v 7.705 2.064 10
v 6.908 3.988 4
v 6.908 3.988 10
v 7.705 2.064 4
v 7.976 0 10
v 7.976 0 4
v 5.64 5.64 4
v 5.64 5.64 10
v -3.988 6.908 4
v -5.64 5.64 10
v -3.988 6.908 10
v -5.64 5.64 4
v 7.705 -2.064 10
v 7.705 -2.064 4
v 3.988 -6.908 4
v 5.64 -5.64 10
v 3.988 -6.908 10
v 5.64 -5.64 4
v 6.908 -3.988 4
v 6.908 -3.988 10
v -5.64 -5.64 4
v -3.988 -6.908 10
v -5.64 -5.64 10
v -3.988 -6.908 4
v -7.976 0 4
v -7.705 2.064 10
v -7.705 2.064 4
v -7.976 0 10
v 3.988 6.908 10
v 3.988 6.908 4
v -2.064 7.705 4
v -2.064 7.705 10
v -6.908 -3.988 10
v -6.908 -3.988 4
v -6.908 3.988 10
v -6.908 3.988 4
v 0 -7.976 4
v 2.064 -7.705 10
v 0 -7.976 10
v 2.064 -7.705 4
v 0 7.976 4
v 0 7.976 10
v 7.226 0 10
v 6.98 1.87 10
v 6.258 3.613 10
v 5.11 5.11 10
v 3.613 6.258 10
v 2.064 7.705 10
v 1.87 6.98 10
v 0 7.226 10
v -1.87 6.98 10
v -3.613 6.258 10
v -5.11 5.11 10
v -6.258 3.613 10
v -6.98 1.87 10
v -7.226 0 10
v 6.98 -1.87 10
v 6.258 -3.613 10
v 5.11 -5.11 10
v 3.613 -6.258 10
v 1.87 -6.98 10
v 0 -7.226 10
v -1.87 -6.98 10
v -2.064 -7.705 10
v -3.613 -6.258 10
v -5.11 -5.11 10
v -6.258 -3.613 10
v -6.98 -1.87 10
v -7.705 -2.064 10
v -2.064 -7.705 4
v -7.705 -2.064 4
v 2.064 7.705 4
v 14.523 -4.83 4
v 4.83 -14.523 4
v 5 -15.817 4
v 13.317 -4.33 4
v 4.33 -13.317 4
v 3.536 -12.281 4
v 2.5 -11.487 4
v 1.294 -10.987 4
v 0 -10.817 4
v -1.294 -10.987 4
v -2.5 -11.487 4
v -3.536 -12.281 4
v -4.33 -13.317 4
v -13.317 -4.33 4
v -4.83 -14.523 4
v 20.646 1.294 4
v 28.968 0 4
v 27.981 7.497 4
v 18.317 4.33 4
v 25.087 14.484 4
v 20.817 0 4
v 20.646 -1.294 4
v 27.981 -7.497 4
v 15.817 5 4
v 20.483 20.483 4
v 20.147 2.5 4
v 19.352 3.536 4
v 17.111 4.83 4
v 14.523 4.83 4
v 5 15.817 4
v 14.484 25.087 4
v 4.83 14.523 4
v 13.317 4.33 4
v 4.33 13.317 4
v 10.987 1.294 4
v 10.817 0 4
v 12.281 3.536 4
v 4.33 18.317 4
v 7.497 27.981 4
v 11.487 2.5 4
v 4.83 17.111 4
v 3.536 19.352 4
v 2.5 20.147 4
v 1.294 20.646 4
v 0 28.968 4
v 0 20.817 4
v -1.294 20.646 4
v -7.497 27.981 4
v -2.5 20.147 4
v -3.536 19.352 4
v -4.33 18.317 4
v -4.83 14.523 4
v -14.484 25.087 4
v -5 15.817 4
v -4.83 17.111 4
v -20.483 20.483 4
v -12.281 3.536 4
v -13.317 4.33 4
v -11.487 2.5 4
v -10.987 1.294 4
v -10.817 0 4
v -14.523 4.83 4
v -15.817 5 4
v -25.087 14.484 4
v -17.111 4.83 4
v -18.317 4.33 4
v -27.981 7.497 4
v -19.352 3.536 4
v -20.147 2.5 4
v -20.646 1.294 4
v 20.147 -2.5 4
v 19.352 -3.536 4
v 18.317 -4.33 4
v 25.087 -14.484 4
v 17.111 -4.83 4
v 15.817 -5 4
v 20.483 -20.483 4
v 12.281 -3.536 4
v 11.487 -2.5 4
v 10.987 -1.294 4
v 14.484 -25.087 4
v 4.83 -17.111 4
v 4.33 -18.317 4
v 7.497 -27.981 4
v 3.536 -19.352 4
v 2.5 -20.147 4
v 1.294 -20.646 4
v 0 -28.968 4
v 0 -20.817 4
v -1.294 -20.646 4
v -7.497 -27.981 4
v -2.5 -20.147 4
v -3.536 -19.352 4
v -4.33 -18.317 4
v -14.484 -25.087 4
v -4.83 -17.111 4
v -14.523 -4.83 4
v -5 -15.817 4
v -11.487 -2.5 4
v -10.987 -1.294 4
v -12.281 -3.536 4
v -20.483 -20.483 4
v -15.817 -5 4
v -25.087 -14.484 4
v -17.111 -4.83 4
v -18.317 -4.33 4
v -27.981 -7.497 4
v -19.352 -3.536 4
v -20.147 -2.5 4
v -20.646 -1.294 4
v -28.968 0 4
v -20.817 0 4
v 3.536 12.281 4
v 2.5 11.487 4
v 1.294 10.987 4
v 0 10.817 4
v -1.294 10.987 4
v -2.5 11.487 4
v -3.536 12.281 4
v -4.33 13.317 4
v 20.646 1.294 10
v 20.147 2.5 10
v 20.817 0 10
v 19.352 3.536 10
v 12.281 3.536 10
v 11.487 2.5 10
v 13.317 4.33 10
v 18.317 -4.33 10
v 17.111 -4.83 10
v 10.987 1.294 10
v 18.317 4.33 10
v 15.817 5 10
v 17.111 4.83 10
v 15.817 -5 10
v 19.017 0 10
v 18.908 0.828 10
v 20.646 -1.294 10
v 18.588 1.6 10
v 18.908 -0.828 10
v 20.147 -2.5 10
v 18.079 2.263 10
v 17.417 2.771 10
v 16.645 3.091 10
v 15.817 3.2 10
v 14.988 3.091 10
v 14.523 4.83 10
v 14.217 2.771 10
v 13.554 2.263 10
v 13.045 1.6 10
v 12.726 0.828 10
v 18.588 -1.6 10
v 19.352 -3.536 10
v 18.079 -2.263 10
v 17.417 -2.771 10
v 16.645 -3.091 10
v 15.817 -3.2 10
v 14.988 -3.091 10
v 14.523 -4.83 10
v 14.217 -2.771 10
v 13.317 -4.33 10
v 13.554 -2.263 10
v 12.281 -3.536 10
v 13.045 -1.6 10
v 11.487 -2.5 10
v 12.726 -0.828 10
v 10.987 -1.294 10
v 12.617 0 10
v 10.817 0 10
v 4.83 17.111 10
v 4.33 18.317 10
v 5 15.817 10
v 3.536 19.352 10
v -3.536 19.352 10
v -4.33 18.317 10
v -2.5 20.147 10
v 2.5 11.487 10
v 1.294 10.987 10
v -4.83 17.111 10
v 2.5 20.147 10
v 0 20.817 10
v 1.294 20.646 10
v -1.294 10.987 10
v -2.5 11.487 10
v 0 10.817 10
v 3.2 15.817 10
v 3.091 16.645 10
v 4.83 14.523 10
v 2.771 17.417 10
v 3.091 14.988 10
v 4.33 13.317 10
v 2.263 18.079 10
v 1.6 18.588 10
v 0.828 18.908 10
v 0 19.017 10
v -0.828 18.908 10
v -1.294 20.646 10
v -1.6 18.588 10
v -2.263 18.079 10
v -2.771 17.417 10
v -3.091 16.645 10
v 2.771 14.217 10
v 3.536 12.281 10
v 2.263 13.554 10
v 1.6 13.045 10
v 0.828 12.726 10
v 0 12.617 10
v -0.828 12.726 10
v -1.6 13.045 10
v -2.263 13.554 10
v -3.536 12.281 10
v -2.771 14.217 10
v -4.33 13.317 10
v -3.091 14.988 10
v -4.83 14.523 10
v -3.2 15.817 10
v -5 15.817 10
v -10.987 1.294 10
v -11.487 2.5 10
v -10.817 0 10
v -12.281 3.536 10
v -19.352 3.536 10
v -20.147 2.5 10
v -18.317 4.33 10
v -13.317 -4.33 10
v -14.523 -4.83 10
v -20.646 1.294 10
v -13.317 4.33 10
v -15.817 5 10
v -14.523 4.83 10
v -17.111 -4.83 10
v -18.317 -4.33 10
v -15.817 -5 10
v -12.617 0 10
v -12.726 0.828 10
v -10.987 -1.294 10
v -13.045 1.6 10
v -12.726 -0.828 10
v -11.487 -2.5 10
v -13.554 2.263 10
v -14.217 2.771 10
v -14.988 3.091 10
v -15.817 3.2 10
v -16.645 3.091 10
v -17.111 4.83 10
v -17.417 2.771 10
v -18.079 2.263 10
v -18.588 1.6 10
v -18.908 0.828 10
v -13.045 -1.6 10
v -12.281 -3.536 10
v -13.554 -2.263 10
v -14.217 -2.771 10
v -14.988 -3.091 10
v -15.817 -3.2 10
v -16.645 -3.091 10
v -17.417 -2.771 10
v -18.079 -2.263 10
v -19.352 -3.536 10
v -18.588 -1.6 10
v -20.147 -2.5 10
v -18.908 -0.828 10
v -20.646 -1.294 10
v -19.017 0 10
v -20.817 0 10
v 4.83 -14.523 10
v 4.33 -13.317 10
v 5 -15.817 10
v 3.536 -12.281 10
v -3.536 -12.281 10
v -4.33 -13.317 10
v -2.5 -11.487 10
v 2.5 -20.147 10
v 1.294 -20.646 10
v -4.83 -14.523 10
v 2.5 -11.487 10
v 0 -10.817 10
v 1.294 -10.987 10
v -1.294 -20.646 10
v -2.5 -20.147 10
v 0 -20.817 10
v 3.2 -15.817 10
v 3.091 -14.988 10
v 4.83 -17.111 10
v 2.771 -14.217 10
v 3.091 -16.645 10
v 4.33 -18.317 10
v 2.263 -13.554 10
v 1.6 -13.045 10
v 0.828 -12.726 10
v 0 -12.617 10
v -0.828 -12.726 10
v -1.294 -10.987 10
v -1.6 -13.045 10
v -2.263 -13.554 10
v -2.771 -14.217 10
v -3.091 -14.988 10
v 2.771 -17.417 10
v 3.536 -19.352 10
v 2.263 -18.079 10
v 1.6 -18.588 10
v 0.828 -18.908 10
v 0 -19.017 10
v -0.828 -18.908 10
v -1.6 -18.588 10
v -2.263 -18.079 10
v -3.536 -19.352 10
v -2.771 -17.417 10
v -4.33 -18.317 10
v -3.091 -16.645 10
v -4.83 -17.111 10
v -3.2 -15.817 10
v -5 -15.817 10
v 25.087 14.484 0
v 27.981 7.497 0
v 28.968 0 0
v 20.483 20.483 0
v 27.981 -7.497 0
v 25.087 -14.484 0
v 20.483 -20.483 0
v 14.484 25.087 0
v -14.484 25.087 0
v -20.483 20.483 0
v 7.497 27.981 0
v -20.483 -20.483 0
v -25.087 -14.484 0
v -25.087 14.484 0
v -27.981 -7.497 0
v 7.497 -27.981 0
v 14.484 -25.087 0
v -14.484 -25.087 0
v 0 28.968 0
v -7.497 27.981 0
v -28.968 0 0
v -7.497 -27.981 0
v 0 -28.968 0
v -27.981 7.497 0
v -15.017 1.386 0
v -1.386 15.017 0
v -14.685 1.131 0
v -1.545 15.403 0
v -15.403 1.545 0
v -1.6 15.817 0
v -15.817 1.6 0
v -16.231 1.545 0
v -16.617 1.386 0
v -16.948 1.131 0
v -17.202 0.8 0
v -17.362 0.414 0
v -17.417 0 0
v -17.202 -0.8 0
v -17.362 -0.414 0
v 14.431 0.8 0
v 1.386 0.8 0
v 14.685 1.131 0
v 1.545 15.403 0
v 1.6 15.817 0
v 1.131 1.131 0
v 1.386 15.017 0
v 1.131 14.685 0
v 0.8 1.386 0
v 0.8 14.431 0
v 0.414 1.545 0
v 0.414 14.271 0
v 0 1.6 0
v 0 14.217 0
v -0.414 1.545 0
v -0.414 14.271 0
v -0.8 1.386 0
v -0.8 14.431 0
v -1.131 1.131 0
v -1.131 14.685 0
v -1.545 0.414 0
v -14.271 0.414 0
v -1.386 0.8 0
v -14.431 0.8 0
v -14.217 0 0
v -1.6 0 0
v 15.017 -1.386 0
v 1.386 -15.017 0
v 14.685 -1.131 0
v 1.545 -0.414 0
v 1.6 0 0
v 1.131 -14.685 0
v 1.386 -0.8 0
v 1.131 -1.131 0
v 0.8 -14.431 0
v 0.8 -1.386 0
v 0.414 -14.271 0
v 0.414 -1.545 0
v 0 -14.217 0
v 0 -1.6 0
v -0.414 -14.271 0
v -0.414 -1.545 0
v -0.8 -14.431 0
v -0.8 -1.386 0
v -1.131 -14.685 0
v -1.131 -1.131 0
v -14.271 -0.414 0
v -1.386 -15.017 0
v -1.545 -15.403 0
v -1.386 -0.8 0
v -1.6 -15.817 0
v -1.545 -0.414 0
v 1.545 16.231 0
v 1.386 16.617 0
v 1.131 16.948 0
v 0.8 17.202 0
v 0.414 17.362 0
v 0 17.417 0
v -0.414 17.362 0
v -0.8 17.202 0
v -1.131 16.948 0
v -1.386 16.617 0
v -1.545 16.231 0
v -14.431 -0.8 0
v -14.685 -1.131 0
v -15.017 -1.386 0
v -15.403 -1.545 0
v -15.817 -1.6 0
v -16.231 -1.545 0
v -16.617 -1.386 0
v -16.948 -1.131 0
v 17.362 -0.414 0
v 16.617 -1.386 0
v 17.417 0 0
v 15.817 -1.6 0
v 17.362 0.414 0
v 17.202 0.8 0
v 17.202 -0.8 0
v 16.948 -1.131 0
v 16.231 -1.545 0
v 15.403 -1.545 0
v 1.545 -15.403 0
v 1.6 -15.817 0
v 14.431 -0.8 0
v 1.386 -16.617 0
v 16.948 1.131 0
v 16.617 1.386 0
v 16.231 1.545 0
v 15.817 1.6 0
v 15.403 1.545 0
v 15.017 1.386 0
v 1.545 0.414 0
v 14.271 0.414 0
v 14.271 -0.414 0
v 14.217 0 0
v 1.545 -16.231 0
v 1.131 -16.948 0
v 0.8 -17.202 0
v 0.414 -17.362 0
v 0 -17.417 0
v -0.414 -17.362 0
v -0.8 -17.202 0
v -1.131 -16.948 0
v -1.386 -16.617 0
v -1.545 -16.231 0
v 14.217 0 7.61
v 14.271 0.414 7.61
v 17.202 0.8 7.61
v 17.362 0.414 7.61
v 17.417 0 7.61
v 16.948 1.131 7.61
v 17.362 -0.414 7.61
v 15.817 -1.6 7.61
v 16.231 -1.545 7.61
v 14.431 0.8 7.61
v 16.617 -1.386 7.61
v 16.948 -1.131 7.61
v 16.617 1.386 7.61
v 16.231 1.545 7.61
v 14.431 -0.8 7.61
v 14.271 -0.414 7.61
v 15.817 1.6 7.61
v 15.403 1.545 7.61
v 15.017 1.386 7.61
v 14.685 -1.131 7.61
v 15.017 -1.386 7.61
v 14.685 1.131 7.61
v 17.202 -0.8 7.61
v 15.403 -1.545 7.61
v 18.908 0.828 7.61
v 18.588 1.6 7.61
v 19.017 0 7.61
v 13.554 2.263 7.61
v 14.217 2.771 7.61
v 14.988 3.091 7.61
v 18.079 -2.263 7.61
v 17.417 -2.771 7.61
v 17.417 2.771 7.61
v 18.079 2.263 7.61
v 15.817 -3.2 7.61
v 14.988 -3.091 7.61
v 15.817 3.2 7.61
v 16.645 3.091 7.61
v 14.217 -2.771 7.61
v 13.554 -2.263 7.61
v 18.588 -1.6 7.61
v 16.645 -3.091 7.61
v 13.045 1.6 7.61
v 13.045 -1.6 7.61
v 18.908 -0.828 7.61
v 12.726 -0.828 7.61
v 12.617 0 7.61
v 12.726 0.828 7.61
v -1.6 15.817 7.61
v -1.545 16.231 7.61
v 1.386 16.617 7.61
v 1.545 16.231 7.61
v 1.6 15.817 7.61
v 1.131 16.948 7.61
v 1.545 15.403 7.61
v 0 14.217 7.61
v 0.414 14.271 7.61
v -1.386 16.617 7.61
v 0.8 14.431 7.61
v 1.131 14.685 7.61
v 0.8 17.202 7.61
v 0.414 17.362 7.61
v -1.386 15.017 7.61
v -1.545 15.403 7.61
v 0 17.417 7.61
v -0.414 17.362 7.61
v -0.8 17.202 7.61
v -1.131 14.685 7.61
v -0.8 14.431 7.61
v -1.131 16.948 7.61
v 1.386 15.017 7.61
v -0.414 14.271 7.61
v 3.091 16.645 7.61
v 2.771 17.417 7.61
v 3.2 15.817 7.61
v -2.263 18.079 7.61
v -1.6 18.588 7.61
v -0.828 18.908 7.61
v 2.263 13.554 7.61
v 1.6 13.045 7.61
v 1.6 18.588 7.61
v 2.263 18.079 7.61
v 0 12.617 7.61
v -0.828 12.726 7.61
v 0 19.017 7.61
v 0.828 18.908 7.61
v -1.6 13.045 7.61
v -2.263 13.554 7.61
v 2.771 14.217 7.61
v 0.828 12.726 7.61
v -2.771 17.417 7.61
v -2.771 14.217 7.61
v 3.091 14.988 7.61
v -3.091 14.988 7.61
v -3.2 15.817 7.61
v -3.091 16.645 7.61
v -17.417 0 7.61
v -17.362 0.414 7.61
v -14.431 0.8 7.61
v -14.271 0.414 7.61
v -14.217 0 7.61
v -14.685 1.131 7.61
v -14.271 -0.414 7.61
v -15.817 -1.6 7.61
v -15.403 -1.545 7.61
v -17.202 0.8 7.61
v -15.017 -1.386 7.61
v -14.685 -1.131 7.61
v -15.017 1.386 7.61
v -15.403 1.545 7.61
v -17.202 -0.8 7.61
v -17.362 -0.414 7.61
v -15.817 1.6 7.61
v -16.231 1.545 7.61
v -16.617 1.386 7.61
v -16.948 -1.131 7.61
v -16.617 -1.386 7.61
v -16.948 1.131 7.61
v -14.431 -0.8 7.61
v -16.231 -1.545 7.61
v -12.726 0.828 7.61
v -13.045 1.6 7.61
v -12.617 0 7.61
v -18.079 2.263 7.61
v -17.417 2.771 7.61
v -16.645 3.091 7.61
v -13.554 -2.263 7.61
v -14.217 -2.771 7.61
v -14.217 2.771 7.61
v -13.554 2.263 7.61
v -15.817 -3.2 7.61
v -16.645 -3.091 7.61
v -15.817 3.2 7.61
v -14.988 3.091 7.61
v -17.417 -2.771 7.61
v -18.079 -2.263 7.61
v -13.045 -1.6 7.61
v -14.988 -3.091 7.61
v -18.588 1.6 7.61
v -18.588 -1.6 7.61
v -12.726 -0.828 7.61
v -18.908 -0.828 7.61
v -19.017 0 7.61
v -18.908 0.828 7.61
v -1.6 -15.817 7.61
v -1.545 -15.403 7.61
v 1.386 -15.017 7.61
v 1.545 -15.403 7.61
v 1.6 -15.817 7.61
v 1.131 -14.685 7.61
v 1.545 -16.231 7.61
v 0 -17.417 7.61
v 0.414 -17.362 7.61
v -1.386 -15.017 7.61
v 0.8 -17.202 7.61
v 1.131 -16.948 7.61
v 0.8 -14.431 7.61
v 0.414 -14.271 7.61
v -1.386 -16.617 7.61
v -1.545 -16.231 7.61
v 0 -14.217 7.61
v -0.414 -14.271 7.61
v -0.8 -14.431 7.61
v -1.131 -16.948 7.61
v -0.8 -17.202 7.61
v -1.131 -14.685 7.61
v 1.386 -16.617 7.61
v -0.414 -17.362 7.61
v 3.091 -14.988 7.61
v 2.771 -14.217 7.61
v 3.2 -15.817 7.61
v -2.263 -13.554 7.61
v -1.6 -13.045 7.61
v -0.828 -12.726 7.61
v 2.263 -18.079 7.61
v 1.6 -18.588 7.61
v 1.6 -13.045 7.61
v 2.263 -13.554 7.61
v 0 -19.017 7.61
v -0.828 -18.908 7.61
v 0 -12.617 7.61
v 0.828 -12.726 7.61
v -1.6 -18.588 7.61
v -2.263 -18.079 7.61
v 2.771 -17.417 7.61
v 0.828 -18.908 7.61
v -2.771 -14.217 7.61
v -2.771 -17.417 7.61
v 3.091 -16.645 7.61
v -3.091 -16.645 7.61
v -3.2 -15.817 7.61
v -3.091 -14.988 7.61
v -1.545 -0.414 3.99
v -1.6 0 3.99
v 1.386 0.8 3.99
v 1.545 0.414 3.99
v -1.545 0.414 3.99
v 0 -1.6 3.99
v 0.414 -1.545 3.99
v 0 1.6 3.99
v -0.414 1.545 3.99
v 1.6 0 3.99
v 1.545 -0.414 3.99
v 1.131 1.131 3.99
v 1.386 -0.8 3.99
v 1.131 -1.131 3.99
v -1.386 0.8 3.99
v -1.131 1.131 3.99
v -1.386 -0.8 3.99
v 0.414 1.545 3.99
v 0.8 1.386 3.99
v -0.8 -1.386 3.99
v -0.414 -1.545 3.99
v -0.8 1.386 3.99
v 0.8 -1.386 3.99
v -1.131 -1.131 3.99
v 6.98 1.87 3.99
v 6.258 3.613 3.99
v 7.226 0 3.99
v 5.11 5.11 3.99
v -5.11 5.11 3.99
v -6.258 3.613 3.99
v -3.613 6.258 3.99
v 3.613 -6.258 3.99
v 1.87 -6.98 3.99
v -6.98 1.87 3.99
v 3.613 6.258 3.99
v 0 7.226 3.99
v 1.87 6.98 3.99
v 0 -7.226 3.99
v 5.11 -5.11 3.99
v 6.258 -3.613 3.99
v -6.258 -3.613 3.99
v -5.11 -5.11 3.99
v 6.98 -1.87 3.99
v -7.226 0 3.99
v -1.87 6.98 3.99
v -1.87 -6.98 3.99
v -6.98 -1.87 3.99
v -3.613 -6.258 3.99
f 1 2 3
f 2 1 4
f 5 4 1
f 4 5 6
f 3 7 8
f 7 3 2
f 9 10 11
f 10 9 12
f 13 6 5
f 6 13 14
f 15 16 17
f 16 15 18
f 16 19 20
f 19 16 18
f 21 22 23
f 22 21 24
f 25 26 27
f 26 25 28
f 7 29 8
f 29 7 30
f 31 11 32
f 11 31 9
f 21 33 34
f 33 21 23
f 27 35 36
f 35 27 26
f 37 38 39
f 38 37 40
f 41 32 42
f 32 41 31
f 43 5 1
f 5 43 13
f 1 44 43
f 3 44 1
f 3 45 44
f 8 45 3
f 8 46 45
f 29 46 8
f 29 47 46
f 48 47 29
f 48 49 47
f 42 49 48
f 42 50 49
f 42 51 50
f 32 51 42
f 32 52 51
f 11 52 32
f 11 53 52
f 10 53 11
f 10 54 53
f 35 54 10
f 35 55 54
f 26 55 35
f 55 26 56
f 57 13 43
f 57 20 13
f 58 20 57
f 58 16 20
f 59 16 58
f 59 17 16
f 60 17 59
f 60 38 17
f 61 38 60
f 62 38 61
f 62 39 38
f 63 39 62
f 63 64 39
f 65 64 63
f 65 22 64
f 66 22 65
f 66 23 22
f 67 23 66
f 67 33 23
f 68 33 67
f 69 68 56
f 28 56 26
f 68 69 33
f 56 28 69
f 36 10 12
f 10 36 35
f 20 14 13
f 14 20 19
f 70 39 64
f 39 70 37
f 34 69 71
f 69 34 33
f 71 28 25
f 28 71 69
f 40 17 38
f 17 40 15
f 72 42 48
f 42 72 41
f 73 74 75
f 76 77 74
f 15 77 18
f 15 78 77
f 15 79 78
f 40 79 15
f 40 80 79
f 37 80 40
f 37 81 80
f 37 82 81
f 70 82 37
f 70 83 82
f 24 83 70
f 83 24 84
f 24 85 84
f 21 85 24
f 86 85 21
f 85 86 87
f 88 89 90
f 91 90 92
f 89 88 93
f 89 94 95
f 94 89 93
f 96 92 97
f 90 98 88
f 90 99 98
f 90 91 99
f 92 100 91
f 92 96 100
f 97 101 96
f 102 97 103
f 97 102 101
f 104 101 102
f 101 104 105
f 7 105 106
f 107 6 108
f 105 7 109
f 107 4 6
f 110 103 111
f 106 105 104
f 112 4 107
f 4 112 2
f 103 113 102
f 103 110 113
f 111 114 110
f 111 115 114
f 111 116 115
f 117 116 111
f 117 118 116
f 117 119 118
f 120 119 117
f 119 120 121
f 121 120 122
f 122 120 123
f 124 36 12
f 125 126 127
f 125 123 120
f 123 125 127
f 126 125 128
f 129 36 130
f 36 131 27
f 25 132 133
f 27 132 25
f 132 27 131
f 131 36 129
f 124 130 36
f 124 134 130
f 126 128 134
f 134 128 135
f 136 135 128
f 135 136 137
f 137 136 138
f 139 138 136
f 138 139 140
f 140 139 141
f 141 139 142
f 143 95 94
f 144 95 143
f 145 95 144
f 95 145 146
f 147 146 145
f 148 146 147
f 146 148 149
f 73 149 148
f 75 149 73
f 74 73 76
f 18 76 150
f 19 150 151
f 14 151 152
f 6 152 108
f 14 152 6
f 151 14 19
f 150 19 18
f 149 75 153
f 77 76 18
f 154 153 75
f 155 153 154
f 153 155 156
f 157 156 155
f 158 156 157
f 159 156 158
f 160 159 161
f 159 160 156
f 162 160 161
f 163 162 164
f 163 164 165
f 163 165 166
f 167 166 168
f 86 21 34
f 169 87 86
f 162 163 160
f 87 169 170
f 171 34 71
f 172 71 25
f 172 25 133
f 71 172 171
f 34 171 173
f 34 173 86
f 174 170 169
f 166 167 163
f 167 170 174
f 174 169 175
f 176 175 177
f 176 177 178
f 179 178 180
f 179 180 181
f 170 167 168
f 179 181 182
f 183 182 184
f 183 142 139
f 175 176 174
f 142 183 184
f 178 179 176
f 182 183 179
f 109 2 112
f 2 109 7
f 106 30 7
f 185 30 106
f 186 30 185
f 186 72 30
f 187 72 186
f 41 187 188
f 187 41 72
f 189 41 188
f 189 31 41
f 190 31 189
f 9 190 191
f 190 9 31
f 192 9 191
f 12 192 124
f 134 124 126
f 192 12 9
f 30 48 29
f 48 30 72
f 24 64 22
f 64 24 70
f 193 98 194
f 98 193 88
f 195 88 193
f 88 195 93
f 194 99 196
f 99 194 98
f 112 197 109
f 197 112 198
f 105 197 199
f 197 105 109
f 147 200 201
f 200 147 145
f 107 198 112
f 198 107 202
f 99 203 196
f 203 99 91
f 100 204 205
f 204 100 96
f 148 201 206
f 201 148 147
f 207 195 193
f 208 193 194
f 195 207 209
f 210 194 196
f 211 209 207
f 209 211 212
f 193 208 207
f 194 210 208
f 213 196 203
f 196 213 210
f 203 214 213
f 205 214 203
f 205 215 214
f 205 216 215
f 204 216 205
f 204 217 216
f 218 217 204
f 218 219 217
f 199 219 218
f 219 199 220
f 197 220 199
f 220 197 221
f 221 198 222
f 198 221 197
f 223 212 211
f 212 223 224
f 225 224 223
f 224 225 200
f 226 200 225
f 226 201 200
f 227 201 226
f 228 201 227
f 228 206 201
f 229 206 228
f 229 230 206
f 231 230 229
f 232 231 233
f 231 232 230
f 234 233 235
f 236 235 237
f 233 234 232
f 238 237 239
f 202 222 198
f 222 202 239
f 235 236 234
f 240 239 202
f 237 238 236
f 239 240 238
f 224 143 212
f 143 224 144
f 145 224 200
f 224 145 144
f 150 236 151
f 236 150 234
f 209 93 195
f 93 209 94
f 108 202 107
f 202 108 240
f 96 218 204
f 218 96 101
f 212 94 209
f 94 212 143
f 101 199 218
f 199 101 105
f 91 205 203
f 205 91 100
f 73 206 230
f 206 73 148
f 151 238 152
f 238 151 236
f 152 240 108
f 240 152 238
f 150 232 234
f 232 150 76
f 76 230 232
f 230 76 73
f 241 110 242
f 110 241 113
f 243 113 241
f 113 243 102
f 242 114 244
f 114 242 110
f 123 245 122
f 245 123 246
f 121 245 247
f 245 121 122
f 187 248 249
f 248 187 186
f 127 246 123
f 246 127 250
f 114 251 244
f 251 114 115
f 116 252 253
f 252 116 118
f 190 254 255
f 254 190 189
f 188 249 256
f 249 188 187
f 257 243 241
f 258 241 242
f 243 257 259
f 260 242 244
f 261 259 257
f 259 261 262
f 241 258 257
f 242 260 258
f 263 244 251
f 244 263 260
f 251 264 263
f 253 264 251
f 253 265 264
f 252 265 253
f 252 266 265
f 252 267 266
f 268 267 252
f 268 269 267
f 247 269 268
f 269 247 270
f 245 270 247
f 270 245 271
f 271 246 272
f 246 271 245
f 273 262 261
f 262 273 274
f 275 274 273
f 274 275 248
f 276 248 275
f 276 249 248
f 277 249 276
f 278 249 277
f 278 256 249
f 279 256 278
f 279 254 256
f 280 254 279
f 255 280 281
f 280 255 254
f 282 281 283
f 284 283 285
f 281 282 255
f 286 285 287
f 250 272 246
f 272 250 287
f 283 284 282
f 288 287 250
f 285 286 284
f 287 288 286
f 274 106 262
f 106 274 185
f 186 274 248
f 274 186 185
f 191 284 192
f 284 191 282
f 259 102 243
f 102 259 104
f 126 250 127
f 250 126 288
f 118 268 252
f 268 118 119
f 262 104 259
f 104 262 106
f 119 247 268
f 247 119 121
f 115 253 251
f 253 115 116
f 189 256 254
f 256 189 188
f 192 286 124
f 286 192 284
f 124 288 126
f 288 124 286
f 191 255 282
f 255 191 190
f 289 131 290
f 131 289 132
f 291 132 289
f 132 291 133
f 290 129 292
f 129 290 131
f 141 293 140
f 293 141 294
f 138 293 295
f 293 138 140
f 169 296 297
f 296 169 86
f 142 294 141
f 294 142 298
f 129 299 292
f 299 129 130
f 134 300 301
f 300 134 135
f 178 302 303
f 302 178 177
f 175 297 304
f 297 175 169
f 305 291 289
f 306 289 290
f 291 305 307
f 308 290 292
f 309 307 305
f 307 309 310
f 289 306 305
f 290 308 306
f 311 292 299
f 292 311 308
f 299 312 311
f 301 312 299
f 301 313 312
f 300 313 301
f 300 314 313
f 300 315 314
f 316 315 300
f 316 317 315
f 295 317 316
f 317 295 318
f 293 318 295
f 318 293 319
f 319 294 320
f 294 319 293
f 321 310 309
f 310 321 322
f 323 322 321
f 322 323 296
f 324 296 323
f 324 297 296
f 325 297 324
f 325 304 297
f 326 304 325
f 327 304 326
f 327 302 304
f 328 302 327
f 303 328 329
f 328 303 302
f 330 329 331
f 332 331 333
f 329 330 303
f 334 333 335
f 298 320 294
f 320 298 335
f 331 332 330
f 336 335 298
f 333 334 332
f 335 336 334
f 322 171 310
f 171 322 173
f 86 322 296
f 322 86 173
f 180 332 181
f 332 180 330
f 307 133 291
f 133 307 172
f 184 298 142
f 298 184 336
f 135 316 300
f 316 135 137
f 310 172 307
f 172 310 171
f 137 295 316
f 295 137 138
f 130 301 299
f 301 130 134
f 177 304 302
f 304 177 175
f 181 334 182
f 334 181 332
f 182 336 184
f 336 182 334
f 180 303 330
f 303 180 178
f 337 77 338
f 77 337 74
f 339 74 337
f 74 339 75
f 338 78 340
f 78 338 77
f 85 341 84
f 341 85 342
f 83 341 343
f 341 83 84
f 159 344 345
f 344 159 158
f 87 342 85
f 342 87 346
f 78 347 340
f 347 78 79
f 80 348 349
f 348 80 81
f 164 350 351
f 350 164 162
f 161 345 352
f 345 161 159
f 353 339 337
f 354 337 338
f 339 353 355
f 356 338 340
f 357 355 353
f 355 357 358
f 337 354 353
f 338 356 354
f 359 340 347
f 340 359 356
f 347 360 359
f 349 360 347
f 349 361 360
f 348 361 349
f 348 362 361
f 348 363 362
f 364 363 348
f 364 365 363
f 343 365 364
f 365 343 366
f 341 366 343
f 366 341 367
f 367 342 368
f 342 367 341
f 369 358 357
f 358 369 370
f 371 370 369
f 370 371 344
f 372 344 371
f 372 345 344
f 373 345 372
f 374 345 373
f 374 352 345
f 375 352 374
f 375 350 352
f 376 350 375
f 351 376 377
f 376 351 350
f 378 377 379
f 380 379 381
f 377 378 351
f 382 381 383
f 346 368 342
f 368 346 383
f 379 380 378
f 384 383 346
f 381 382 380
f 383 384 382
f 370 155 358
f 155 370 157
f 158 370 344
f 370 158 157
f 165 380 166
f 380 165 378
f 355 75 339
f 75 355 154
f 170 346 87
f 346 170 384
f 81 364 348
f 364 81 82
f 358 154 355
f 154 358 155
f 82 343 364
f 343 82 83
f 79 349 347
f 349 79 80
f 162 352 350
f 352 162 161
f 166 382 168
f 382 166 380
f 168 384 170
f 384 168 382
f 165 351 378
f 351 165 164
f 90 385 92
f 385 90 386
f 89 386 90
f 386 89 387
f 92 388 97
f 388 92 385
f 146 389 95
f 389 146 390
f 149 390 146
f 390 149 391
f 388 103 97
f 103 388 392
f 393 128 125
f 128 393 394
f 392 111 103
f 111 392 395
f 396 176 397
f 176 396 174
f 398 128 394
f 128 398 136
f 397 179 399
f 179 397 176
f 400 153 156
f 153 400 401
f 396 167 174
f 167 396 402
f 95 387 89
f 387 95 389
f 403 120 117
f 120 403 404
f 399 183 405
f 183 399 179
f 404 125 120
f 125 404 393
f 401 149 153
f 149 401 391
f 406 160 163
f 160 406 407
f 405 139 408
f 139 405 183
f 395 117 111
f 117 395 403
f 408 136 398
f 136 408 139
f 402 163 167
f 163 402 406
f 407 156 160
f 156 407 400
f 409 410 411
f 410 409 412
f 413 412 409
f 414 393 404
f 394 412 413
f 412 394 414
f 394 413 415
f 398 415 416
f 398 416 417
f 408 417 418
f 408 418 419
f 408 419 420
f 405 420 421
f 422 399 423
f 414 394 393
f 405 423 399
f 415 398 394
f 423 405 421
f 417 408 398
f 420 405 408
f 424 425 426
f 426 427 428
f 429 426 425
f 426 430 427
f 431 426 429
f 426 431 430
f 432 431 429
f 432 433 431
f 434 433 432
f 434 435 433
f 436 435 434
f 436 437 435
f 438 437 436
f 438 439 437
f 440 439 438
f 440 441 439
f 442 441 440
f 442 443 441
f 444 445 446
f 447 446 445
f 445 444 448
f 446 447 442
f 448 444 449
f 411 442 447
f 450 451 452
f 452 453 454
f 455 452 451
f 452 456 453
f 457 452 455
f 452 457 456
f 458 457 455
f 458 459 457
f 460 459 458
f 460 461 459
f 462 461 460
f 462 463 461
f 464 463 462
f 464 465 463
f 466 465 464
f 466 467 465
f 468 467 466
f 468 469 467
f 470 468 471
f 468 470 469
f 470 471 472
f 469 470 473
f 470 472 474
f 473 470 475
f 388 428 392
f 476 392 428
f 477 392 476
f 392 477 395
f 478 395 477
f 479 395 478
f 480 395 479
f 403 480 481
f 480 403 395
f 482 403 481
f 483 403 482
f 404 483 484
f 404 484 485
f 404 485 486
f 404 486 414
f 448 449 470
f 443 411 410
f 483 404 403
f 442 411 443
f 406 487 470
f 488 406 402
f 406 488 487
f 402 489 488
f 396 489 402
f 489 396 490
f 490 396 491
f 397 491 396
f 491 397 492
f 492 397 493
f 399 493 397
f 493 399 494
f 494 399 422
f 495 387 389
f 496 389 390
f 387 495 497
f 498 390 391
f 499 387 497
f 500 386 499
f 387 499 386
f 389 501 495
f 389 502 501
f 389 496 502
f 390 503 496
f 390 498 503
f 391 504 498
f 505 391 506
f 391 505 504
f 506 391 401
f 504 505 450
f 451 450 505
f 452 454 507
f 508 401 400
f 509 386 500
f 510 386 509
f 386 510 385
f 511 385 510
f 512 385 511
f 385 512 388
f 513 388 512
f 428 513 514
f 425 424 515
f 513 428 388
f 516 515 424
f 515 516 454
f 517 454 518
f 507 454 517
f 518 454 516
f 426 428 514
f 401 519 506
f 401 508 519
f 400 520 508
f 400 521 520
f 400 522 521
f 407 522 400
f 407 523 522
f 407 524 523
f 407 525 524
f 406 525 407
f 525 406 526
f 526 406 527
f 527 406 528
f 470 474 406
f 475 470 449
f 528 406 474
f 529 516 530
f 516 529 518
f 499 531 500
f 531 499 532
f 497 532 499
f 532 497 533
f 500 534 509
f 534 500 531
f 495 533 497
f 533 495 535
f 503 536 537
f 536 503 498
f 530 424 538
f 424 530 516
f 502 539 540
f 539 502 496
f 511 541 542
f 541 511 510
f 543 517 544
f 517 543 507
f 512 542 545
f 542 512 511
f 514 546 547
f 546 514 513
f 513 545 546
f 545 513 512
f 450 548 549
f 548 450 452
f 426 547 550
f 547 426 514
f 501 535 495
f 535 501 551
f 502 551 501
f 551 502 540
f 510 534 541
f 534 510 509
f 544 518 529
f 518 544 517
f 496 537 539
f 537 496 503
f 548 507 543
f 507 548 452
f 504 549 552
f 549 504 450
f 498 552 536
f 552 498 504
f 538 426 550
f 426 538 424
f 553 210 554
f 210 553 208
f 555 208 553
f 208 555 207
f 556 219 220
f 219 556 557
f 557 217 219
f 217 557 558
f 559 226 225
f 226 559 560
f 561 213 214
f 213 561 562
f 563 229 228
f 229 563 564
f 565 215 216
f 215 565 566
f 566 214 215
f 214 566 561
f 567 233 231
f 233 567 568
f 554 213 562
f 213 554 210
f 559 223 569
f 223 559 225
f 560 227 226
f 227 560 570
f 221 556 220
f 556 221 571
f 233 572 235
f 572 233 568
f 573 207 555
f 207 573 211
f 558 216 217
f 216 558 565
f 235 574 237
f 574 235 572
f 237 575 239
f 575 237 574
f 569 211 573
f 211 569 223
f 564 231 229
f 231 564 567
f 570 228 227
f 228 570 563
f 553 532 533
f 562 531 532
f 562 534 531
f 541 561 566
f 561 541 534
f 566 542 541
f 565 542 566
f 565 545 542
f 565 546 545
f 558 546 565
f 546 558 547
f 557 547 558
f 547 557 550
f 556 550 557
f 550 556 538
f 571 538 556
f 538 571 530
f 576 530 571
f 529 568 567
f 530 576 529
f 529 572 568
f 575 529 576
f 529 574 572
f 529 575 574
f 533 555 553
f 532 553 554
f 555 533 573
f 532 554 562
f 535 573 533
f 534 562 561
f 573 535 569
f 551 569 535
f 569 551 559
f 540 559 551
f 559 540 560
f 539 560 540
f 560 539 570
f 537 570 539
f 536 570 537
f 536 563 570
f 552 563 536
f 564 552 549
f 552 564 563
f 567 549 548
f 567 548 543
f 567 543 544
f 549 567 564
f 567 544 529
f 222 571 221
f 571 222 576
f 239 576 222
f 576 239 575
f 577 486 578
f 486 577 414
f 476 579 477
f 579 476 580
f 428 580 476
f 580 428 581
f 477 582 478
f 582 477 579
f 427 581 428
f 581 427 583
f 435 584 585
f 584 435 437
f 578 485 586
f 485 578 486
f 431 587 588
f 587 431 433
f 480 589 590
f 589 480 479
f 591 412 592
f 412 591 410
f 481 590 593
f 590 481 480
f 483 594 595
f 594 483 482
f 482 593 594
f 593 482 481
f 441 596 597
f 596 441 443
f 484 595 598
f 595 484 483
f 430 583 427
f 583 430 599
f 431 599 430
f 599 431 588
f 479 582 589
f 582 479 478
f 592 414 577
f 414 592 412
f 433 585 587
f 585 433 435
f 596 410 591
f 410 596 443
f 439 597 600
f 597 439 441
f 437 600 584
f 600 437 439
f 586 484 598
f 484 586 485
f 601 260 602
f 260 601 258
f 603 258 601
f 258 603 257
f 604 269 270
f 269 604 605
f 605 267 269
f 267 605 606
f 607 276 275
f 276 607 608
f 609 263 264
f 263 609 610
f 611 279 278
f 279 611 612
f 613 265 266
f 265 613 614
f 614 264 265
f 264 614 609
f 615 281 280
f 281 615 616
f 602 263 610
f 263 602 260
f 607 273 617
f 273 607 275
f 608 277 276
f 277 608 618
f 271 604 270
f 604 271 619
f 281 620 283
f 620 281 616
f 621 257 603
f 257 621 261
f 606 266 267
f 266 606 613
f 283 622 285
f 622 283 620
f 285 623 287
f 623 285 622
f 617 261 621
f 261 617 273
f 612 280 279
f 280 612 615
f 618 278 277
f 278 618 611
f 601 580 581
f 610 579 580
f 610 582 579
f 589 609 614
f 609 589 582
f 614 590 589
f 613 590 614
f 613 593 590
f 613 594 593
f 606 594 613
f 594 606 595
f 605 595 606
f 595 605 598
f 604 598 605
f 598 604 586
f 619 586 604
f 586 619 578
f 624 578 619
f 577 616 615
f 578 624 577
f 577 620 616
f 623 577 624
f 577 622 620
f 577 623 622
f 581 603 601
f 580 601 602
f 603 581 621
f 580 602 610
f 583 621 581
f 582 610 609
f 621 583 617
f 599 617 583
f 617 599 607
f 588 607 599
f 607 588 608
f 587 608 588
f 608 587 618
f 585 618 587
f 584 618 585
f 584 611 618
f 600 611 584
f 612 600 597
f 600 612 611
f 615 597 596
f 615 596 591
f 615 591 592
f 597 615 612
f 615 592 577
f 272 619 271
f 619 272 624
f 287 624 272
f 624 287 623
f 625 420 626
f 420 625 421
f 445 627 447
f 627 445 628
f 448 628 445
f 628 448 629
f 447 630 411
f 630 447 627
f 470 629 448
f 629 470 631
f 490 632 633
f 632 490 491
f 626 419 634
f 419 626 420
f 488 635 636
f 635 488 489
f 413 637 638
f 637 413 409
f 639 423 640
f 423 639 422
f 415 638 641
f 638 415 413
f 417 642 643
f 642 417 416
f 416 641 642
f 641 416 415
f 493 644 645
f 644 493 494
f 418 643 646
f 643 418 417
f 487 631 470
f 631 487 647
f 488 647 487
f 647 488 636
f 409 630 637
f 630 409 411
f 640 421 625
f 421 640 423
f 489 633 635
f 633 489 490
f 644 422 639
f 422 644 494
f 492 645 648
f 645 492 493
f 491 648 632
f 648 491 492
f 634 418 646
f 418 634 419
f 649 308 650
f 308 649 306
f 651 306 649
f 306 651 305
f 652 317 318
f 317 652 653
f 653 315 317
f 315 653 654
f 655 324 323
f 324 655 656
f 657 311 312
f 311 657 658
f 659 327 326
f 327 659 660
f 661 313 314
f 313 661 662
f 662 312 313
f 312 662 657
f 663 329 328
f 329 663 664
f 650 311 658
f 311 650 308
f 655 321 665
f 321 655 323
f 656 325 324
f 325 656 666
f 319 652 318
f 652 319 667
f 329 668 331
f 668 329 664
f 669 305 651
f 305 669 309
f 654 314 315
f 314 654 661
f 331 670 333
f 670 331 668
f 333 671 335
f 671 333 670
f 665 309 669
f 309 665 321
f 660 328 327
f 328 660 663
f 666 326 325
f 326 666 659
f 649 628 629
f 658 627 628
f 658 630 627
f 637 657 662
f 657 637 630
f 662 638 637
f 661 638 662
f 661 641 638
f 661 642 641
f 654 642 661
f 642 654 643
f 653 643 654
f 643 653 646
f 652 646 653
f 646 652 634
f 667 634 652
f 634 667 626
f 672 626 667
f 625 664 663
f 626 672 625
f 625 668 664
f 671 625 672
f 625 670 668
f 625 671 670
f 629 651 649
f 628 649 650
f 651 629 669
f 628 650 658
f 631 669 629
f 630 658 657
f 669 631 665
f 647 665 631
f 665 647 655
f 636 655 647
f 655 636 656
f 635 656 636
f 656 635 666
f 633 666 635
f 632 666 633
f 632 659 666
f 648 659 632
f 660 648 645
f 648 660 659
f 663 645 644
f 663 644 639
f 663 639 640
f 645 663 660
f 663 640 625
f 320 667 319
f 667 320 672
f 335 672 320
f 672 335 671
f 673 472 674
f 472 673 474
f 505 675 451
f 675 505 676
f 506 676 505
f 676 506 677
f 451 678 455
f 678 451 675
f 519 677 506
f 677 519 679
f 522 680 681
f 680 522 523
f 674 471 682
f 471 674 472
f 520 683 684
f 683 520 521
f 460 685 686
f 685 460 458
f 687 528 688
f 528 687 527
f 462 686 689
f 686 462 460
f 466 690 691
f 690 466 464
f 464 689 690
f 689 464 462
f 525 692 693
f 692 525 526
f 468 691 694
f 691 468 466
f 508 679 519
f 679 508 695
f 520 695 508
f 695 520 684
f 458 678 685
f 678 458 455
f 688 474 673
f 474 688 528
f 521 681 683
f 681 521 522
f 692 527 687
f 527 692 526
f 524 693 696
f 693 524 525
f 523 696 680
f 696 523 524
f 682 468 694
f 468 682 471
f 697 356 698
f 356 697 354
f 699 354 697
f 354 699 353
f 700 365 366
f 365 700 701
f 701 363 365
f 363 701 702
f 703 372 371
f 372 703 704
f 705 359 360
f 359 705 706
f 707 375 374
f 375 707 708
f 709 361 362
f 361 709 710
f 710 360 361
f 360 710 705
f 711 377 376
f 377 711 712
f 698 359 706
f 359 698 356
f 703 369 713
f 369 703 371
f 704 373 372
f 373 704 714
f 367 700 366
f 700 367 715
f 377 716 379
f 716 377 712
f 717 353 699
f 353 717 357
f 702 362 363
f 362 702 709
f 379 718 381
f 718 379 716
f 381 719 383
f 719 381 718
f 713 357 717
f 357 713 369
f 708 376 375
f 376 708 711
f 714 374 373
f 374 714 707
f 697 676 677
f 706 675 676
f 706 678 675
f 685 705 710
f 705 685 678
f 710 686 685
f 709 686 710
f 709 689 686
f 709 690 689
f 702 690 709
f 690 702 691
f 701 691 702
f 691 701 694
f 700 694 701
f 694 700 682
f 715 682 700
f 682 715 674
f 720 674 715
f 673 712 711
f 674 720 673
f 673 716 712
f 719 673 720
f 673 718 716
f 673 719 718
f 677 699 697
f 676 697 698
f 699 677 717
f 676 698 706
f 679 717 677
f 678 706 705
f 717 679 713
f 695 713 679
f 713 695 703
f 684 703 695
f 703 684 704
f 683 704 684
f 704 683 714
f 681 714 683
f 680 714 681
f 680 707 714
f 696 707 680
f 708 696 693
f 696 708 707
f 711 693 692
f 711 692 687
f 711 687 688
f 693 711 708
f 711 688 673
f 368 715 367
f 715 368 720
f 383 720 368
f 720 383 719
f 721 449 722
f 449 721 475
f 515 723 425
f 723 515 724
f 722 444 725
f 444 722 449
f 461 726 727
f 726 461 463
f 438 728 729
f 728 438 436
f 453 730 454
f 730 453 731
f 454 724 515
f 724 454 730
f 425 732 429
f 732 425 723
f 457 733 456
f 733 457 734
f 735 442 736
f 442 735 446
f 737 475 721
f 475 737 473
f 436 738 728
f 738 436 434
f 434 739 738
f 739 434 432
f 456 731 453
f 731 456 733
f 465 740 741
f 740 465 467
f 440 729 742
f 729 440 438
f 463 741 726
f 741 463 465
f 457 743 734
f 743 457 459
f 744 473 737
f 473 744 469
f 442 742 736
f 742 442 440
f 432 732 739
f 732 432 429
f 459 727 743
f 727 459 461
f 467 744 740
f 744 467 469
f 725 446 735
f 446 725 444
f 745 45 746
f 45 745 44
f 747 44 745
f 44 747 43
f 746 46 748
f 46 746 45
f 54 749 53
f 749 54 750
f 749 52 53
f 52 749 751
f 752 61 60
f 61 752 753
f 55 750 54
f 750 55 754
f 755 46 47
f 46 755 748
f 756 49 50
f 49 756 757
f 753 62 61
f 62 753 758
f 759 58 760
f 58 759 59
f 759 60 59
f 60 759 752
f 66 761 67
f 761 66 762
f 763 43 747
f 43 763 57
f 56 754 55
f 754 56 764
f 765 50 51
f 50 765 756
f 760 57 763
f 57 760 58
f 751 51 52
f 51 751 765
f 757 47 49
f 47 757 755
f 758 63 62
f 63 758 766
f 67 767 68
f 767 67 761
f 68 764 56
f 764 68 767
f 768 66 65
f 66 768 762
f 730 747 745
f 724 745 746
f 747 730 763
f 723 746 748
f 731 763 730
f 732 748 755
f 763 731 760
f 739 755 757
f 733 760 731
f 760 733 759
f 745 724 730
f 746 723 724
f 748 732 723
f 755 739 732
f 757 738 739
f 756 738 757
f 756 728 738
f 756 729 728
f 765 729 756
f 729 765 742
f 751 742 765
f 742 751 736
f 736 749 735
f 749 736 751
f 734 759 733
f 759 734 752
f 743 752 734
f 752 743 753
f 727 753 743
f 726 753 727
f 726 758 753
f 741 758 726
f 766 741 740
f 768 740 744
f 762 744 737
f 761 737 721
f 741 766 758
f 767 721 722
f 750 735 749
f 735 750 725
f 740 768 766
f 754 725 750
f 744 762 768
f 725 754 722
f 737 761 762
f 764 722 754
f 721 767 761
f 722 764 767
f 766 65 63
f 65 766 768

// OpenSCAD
//====================================================
// Печатная оснастка для геликальной антенны (спираль не выводится)
// DEV версия v16
//====================================================
// Задача: печатные детали для сборки axial-mode геликальной антенны:
// - Труба для намотки (опционально канавка-ориентир; спираль не печатается)
// - Шаблон для сверления/резки рефлектора (опционально)
// - Крепеж из 2 деталей: (A) площадка под трубу с кольцом и стойками, (B) крепление к плоскости с 4 ушами
// - Посадка под SMA на квадратной площадке со стороны рефлектора
// - Опциональный кондуктор для гибки дельта-матча (сам дельта-матч - проволока)
//
// Единицы: миллиметры
//====================================================

/* [Быстрый экспорт] */
export_part = "plate"; // [assembly,tube,tube_section,plate,wall_mount,reflector_template,delta_jig]

// что вывести/экспортировать

/* [РЧ параметры] */
freq_mhz = 5800;          // Рабочая частота (МГц)
target_gain_dbi = 12;     // Только для расчёта длины трубы (спираль не выводится)
polarization = "RHCP";    // [RHCP,LHCP]

// ориентир: RHCP/LHCP

/* [Геометрия спирали] */
circumference_factor = 1.00;  // C ≈ 1.0*λ (старт для axial-mode)
pitch_factor = 0.25;          // S ≈ 0.25*λ (старт для axial-mode)
min_turns = 5.5;
max_turns = 14;

/* [Проволока и согласование] */
wire_d = 1.2;                 // Диаметр проволоки (мм)
wire_material = "CuAlloy";    // [CuAlloy,Brass,Al]

// потери разные; геометрия важнее для согласования
delta_mode = "auto";          // [auto,manual] auto=авторасчёт, manual=вручную
delta_base_manual = 0;        // мм (0 = игнорировать)
delta_height_manual = 0;      // мм (0 = игнорировать)
delta_tap_manual = 0;         // мм от "заземлённого" конца по стороне треугольника (0 = игнорировать)

/* [Труба намотки] */
tube_wall = 2.0;              // mm
tube_clearance = 0.25;        // мм (посадка на кольцо)
tube_groove_enable = true;    // делать направляющую канавку (для ровной укладки проволоки)

groove_segments_per_turn = 24; // Кол-во сегментов канавки на один виток (выше = ровнее, но медленнее)

tube_groove_depth = 0.5;      // мм (глубина канавки в трубе)
tube_groove_width = 1.2;      // mm
tube_sections = 3;            // кол-во секций трубы для печати
tube_section_gap = 0.25;      // мм зазор между секциями (допуск сборки)
export_section = 0;           // какую секцию экспортировать при export_part="tube_section"

/* [Площадка под трубу] */
plate_thickness = 4.0;        // mm
plate_od_extra = 14;          // мм запас за край рефлектора для прочности
spigot_height = 6.0;          // mm
standoff_count = 4;
standoff_d = 10.0;            // мм (наружный диаметр)
standoff_h = 6.0;             // мм (высота над площадкой)
clamp_screw_d = 3.2;          // мм проход под M3 (поменяй под свой крепёж)
clamp_screw_head_d = 6.4;     // опциональная выборка под шляпку
clamp_screw_head_h = 2.4;

/* [Крепление к плоскости] */
wall_block_thickness = 5.0;   // мм (по твоему ТЗ)
wall_block_xy = 28;           // мм габарит опорного блока (примерно квадрат)
lug_length = 10;              // mm
lug_width = 10;               // mm
lug_hole_d = 5.0;             // мм (по твоему ТЗ)
lug_pair_gap = 10;            // мм расстояние между двумя ушами на одной стороне

/* [Шаблон рефлектора] */
reflector_mode = "auto";      // [auto,manual] auto=авто, manual=вручную
reflector_d_manual = 120;     // мм если manual
reflector_thickness_template = 1.0;  // мм (только шаблон; реальный рефлектор обычно из металла)

/* [Разъем SMA на площадке] */
// Твой SMA: квадрат ~12.6 мм, отверстия по углам ~8 мм (центр-центр) ~8mm (center-to-center)
sma_flange_side = 12.6;       // мм (сторона квадратной площадки)
sma_hole_spacing = 8.0;       // mm (center-to-center)
sma_flange_hole_d = 2.4;      // мм (под винтики разъёма)
sma_center_hole_d = 6.6;      // мм (отверстие под тело разъёма)
sma_offset_r = 0;             // мм смещение от центра (0 = по центру)

/* [Качество рендера] */
preview_mode = true;         // Быстрый режим для превью (резко ускоряет первый рендер)
render_preset = "normal";    // [fast,normal,pretty] fast=быстро, normal=нормально, pretty=красиво

// Внутренняя настройка качества (не трогай, если не нужно)
$fn = (preview_mode || render_preset=="fast") ? 24 :
      (render_preset=="pretty" ? 96 : 48);


//====================================================
// Derived values
//====================================================
function clamp(x, a, b) = x < a ? a : (x > b ? b : x);

// Speed of light (mm/s)
c_mm_s = 299792458000;
freq_hz = freq_mhz * 1e6;
lambda_mm = c_mm_s / freq_hz;

// Axial-mode starting values (tube sizing only)
circ_mm = lambda_mm * circumference_factor;
tube_od = circ_mm / PI;
pitch_mm = lambda_mm * pitch_factor;

// Tube length sizing by gain rule-of-thumb
turns_raw = pow(10, (target_gain_dbi - 5.4)/10);
turns = clamp(turns_raw, min_turns, max_turns);
tube_len = turns * pitch_mm;

// Reflector diameter (auto start)
reflector_d_auto = lambda_mm * 0.85;
reflector_d = (reflector_mode == "manual") ? reflector_d_manual : reflector_d_auto;

// Plate OD: slightly larger than reflector
plate_od = reflector_d + plate_od_extra;

// Spigot geometry: tube slips OVER spigot
tube_id = tube_od - 2*tube_wall;
spigot_od = tube_id - 2*tube_clearance;
spigot_id = max(0.1, spigot_od - 2.4);

// Standoff circle radius
standoff_r = (reflector_d/2) * 0.72;

//====================================================
// Delta-match "auto" starting geometry
//====================================================
// Starting point (empirical): base ~0.18λ, height ~0.10λ, tap ~45% of height.
// Material mostly affects loss (Q); geometry dominates match.
// Expect tuning in the real build.
mat_k = (wire_material == "Brass") ? 0.995 : (wire_material == "Al") ? 0.990 : 1.000;
wd_k = 1.0 - clamp((wire_d - 1.0) * 0.002, -0.02, 0.02);

delta_base_auto = lambda_mm * 0.18 * mat_k * wd_k;
delta_height_auto = lambda_mm * 0.10 * mat_k * wd_k;
delta_tap_auto = delta_height_auto * 0.45;

delta_base = (delta_mode == "manual" && delta_base_manual > 0) ? delta_base_manual : delta_base_auto;
delta_height = (delta_mode == "manual" && delta_height_manual > 0) ? delta_height_manual : delta_height_auto;
delta_tap = (delta_mode == "manual" && delta_tap_manual > 0) ? delta_tap_manual : delta_tap_auto;

// Print computed values in OpenSCAD console
echo("==== Helical Antenna v13 (mechanical parts only) ====");
echo("freq_mhz=", freq_mhz, " lambda_mm=", lambda_mm);
echo("tube_od(mm)=", tube_od, " tube_len(mm)=", tube_len, " pitch(mm)=", pitch_mm, " turns=", turns);
echo("reflector_d(mm)=", reflector_d);
echo("Delta-match (start) base(mm)=", delta_base, " height(mm)=", delta_height, " tap(mm)=", delta_tap);
echo("Polarization=", polarization);

//====================================================
// Modules
//====================================================

module drill_hole(d, h, cbore_d=0, cbore_h=0) {
    cylinder(d=d, h=h, center=false);
    if (cbore_d > 0 && cbore_h > 0)
        translate([0,0,h-cbore_h]) cylinder(d=cbore_d, h=cbore_h, center=false);
}


// Быстрый "стержень" между двумя точками (для канавки). Нам достаточно цилиндра.
module rod_between(p0, p1, d) {
    v = [p1[0]-p0[0], p1[1]-p0[1], p1[2]-p0[2]];
    h = norm(v);
    if (h > 0) {
        // Ось Z -> вектор v (быстро, без hull/sphere)
        ax = cross([0,0,1], v);
        axn = norm(ax);
        ang = acos(v[2] / h);

        translate(p0) {
            if (axn < 1e-9) {
                cylinder(d=d, h=h, center=false);
            } else {
                rotate(a=ang, v=ax) cylinder(d=d, h=h, center=false);
            }
        }
    }
}

module sma_flange_holes(th) {
    for (sx=[-1,1], sy=[-1,1]) {
        translate([sx*sma_hole_spacing/2, sy*sma_hole_spacing/2, 0])
            cylinder(d=sma_flange_hole_d, h=th, center=false);
    }
}

module sma_center_hole(th) {
    cylinder(d=sma_center_hole_d, h=th, center=false);
}

module plate_part() {
    // Part A: plate + spigot + standoffs
    difference() {
        union() {
            cylinder(d=plate_od, h=plate_thickness);

            translate([0,0,plate_thickness])
                difference() {
                    cylinder(d=spigot_od + 4.0, h=spigot_height);
                    translate([0,0,-0.01]) cylinder(d=spigot_od, h=spigot_height+0.02);
                }

            for (i=[0:standoff_count-1]) {
                ang = 360*i/standoff_count;
                translate([standoff_r*cos(ang), standoff_r*sin(ang), plate_thickness])
                    cylinder(d=standoff_d, h=standoff_h);
            }
        }

        // Central clamp screw
        translate([0,0,-0.01])
            cylinder(d=clamp_screw_d, h=plate_thickness+spigot_height+standoff_h+0.02);

        // Clamp holes in standoffs
        for (i=[0:standoff_count-1]) {
            ang = 360*i/standoff_count;
            translate([standoff_r*cos(ang), standoff_r*sin(ang), -0.01])
                drill_hole(clamp_screw_d, plate_thickness+standoff_h+0.02, clamp_screw_head_d, clamp_screw_head_h);
        }

        // Tube inner clearance
        translate([0,0,plate_thickness-0.01])
            cylinder(d=tube_id + 2.0, h=spigot_height+standoff_h+0.02);
    }
}

module wall_mount_part() {
    // Part B: wall/plane mount block with 4 lugs (Ø5 holes) + clamp holes aligned to standoffs
    difference() {
        union() {
            translate([-wall_block_xy/2, -wall_block_xy/2, 0])
                cube([wall_block_xy, wall_block_xy, wall_block_thickness]);

            // Two lugs on +Y side
            for (k=[-1,1]) {
                translate([k*(lug_pair_gap/2), wall_block_xy/2, 0])
                    translate([-lug_width/2, 0, 0])
                        cube([lug_width, lug_length, wall_block_thickness]);
            }
            // Two lugs on -Y side
            for (k=[-1,1]) {
                translate([k*(lug_pair_gap/2), -wall_block_xy/2 - lug_length, 0])
                    translate([-lug_width/2, 0, 0])
                        cube([lug_width, lug_length, wall_block_thickness]);
            }
        }

        // Four Ø5 through-holes in lugs
        for (side=[1,-1]) for (k=[-1,1]) {
            y0 = (side==1) ? (wall_block_xy/2 + lug_length/2) : (-wall_block_xy/2 - lug_length/2);
            translate([k*(lug_pair_gap/2), y0, -0.01])
                cylinder(d=lug_hole_d, h=wall_block_thickness+0.02);
        }

        // Clamp-screw clearance holes aligned with plate standoffs
        for (i=[0:standoff_count-1]) {
            ang = 360*i/standoff_count;
            translate([standoff_r*cos(ang), standoff_r*sin(ang), -0.01])
                cylinder(d=clamp_screw_d, h=wall_block_thickness+0.02);
        }

        // Central clamp screw
        translate([0,0,-0.01])
            cylinder(d=clamp_screw_d, h=wall_block_thickness+0.02);
    }
}

module reflector_template() {
    // Optional: printable drilling/cutting template for your metal reflector.
    difference() {
        cylinder(d=reflector_d, h=reflector_thickness_template);

        // Clamp holes
        for (i=[0:standoff_count-1]) {
            ang = 360*i/standoff_count;
            translate([standoff_r*cos(ang), standoff_r*sin(ang), -0.01])
                cylinder(d=clamp_screw_d, h=reflector_thickness_template+0.02);
        }

        // Central clamp hole
        translate([0,0,-0.01]) cylinder(d=clamp_screw_d, h=reflector_thickness_template+0.02);

        // SMA footprint
        translate([sma_offset_r,0,-0.01]) {
            sma_center_hole(reflector_thickness_template+0.02);
            sma_flange_holes(reflector_thickness_template+0.02);
        }
    }
}

module tube_single() {
    // Труба с опциональной неглубокой канавкой-ориентиром (спираль не печатается)
    difference() {
        // Outer tube
        cylinder(d=tube_od, h=tube_len);

        // Inner bore
        translate([0,0,-0.01]) cylinder(d=tube_id, h=tube_len+0.02);

        // Shallow guide groove cutter (biting only tube_groove_depth)
        if (tube_groove_enable) {
            // В превью резко снижаем детализацию, иначе OpenSCAD будет "умирать"
            seg_per_turn = (preview_mode || render_preset=="fast") ? max(8, floor(groove_segments_per_turn/3)) : groove_segments_per_turn;
            steps = max( max(24, ceil(turns*seg_per_turn)), ceil(tube_len/2) );
            r_cut = tube_od/2 - tube_groove_depth/2;

            for (i=[0:steps-1]) {
                t0 = i/steps;
                t1 = (i+1)/steps;
                z0 = t0*tube_len;
                z1 = t1*tube_len;
                a0 = 360*turns*t0 * ((polarization=="RHCP") ? 1 : -1);
                a1 = 360*turns*t1 * ((polarization=="RHCP") ? 1 : -1);

                p0 = [r_cut*cos(a0), r_cut*sin(a0), z0];
                p1 = [r_cut*cos(a1), r_cut*sin(a1), z1];
                rod_between(p0, p1, tube_groove_width);
            }
        }
    }
}

module tube_section(idx=0) {
    seg_len = (tube_len - (tube_sections-1)*tube_section_gap) / tube_sections;
    z0 = idx*(seg_len + tube_section_gap);

    // Move section to origin for export convenience
    translate([0,0,-z0])
        intersection() {
            tube_single();
            translate([-tube_od, -tube_od, z0])
                cube([2*tube_od, 2*tube_od, seg_len]);
        }
}

module delta_match_jig() {
    // A flat jig to bend the delta-match wire to the computed triangle.
    base_th = 4;
    peg_h = 8;
    peg_d = max(wire_d*2.2, 3.5);

    pA = [0, 0];                 // grounded end
    pB = [delta_base, 0];        // helix end (on first turn)
    pC = [0, delta_height];      // apex
    pT = [0, delta_tap];         // tap point on A->C

    pad = 10;
    w = delta_base + pad*2;
    h = delta_height + pad*2;

    translate([-pad, -pad, 0]) cube([w, h, base_th]);

    for (p=[pA,pB,pC,pT]) {
        translate([p[0], p[1], base_th])
            cylinder(d=peg_d, h=peg_h);
    }
}

module assembly() {
    // Stack view (bottom -> top): wall_mount -> reflector template (hover) -> plate -> tube
    wall_mount_part();

    // template hovering for reference
    translate([0,0,wall_block_thickness + 0.2])
        reflector_template();

    translate([0,0,wall_block_thickness + 0.2 + reflector_thickness_template + 0.2])
        plate_part();

    translate([0,0,wall_block_thickness + 0.2 + reflector_thickness_template + 0.2 + plate_thickness])
        tube_single();
}

//====================================================
// Main switch
//====================================================
if (export_part == "assembly") {
    assembly();
} else if (export_part == "tube") {
    tube_single();
} else if (export_part == "tube_section") {
    tube_section(export_section);
} else if (export_part == "plate") {
    plate_part();
} else if (export_part == "wall_mount") {
    wall_mount_part();
} else if (export_part == "reflector_template") {
    reflector_template();
} else if (export_part == "delta_jig") {
    delta_match_jig();
} else {
    assembly();
}
